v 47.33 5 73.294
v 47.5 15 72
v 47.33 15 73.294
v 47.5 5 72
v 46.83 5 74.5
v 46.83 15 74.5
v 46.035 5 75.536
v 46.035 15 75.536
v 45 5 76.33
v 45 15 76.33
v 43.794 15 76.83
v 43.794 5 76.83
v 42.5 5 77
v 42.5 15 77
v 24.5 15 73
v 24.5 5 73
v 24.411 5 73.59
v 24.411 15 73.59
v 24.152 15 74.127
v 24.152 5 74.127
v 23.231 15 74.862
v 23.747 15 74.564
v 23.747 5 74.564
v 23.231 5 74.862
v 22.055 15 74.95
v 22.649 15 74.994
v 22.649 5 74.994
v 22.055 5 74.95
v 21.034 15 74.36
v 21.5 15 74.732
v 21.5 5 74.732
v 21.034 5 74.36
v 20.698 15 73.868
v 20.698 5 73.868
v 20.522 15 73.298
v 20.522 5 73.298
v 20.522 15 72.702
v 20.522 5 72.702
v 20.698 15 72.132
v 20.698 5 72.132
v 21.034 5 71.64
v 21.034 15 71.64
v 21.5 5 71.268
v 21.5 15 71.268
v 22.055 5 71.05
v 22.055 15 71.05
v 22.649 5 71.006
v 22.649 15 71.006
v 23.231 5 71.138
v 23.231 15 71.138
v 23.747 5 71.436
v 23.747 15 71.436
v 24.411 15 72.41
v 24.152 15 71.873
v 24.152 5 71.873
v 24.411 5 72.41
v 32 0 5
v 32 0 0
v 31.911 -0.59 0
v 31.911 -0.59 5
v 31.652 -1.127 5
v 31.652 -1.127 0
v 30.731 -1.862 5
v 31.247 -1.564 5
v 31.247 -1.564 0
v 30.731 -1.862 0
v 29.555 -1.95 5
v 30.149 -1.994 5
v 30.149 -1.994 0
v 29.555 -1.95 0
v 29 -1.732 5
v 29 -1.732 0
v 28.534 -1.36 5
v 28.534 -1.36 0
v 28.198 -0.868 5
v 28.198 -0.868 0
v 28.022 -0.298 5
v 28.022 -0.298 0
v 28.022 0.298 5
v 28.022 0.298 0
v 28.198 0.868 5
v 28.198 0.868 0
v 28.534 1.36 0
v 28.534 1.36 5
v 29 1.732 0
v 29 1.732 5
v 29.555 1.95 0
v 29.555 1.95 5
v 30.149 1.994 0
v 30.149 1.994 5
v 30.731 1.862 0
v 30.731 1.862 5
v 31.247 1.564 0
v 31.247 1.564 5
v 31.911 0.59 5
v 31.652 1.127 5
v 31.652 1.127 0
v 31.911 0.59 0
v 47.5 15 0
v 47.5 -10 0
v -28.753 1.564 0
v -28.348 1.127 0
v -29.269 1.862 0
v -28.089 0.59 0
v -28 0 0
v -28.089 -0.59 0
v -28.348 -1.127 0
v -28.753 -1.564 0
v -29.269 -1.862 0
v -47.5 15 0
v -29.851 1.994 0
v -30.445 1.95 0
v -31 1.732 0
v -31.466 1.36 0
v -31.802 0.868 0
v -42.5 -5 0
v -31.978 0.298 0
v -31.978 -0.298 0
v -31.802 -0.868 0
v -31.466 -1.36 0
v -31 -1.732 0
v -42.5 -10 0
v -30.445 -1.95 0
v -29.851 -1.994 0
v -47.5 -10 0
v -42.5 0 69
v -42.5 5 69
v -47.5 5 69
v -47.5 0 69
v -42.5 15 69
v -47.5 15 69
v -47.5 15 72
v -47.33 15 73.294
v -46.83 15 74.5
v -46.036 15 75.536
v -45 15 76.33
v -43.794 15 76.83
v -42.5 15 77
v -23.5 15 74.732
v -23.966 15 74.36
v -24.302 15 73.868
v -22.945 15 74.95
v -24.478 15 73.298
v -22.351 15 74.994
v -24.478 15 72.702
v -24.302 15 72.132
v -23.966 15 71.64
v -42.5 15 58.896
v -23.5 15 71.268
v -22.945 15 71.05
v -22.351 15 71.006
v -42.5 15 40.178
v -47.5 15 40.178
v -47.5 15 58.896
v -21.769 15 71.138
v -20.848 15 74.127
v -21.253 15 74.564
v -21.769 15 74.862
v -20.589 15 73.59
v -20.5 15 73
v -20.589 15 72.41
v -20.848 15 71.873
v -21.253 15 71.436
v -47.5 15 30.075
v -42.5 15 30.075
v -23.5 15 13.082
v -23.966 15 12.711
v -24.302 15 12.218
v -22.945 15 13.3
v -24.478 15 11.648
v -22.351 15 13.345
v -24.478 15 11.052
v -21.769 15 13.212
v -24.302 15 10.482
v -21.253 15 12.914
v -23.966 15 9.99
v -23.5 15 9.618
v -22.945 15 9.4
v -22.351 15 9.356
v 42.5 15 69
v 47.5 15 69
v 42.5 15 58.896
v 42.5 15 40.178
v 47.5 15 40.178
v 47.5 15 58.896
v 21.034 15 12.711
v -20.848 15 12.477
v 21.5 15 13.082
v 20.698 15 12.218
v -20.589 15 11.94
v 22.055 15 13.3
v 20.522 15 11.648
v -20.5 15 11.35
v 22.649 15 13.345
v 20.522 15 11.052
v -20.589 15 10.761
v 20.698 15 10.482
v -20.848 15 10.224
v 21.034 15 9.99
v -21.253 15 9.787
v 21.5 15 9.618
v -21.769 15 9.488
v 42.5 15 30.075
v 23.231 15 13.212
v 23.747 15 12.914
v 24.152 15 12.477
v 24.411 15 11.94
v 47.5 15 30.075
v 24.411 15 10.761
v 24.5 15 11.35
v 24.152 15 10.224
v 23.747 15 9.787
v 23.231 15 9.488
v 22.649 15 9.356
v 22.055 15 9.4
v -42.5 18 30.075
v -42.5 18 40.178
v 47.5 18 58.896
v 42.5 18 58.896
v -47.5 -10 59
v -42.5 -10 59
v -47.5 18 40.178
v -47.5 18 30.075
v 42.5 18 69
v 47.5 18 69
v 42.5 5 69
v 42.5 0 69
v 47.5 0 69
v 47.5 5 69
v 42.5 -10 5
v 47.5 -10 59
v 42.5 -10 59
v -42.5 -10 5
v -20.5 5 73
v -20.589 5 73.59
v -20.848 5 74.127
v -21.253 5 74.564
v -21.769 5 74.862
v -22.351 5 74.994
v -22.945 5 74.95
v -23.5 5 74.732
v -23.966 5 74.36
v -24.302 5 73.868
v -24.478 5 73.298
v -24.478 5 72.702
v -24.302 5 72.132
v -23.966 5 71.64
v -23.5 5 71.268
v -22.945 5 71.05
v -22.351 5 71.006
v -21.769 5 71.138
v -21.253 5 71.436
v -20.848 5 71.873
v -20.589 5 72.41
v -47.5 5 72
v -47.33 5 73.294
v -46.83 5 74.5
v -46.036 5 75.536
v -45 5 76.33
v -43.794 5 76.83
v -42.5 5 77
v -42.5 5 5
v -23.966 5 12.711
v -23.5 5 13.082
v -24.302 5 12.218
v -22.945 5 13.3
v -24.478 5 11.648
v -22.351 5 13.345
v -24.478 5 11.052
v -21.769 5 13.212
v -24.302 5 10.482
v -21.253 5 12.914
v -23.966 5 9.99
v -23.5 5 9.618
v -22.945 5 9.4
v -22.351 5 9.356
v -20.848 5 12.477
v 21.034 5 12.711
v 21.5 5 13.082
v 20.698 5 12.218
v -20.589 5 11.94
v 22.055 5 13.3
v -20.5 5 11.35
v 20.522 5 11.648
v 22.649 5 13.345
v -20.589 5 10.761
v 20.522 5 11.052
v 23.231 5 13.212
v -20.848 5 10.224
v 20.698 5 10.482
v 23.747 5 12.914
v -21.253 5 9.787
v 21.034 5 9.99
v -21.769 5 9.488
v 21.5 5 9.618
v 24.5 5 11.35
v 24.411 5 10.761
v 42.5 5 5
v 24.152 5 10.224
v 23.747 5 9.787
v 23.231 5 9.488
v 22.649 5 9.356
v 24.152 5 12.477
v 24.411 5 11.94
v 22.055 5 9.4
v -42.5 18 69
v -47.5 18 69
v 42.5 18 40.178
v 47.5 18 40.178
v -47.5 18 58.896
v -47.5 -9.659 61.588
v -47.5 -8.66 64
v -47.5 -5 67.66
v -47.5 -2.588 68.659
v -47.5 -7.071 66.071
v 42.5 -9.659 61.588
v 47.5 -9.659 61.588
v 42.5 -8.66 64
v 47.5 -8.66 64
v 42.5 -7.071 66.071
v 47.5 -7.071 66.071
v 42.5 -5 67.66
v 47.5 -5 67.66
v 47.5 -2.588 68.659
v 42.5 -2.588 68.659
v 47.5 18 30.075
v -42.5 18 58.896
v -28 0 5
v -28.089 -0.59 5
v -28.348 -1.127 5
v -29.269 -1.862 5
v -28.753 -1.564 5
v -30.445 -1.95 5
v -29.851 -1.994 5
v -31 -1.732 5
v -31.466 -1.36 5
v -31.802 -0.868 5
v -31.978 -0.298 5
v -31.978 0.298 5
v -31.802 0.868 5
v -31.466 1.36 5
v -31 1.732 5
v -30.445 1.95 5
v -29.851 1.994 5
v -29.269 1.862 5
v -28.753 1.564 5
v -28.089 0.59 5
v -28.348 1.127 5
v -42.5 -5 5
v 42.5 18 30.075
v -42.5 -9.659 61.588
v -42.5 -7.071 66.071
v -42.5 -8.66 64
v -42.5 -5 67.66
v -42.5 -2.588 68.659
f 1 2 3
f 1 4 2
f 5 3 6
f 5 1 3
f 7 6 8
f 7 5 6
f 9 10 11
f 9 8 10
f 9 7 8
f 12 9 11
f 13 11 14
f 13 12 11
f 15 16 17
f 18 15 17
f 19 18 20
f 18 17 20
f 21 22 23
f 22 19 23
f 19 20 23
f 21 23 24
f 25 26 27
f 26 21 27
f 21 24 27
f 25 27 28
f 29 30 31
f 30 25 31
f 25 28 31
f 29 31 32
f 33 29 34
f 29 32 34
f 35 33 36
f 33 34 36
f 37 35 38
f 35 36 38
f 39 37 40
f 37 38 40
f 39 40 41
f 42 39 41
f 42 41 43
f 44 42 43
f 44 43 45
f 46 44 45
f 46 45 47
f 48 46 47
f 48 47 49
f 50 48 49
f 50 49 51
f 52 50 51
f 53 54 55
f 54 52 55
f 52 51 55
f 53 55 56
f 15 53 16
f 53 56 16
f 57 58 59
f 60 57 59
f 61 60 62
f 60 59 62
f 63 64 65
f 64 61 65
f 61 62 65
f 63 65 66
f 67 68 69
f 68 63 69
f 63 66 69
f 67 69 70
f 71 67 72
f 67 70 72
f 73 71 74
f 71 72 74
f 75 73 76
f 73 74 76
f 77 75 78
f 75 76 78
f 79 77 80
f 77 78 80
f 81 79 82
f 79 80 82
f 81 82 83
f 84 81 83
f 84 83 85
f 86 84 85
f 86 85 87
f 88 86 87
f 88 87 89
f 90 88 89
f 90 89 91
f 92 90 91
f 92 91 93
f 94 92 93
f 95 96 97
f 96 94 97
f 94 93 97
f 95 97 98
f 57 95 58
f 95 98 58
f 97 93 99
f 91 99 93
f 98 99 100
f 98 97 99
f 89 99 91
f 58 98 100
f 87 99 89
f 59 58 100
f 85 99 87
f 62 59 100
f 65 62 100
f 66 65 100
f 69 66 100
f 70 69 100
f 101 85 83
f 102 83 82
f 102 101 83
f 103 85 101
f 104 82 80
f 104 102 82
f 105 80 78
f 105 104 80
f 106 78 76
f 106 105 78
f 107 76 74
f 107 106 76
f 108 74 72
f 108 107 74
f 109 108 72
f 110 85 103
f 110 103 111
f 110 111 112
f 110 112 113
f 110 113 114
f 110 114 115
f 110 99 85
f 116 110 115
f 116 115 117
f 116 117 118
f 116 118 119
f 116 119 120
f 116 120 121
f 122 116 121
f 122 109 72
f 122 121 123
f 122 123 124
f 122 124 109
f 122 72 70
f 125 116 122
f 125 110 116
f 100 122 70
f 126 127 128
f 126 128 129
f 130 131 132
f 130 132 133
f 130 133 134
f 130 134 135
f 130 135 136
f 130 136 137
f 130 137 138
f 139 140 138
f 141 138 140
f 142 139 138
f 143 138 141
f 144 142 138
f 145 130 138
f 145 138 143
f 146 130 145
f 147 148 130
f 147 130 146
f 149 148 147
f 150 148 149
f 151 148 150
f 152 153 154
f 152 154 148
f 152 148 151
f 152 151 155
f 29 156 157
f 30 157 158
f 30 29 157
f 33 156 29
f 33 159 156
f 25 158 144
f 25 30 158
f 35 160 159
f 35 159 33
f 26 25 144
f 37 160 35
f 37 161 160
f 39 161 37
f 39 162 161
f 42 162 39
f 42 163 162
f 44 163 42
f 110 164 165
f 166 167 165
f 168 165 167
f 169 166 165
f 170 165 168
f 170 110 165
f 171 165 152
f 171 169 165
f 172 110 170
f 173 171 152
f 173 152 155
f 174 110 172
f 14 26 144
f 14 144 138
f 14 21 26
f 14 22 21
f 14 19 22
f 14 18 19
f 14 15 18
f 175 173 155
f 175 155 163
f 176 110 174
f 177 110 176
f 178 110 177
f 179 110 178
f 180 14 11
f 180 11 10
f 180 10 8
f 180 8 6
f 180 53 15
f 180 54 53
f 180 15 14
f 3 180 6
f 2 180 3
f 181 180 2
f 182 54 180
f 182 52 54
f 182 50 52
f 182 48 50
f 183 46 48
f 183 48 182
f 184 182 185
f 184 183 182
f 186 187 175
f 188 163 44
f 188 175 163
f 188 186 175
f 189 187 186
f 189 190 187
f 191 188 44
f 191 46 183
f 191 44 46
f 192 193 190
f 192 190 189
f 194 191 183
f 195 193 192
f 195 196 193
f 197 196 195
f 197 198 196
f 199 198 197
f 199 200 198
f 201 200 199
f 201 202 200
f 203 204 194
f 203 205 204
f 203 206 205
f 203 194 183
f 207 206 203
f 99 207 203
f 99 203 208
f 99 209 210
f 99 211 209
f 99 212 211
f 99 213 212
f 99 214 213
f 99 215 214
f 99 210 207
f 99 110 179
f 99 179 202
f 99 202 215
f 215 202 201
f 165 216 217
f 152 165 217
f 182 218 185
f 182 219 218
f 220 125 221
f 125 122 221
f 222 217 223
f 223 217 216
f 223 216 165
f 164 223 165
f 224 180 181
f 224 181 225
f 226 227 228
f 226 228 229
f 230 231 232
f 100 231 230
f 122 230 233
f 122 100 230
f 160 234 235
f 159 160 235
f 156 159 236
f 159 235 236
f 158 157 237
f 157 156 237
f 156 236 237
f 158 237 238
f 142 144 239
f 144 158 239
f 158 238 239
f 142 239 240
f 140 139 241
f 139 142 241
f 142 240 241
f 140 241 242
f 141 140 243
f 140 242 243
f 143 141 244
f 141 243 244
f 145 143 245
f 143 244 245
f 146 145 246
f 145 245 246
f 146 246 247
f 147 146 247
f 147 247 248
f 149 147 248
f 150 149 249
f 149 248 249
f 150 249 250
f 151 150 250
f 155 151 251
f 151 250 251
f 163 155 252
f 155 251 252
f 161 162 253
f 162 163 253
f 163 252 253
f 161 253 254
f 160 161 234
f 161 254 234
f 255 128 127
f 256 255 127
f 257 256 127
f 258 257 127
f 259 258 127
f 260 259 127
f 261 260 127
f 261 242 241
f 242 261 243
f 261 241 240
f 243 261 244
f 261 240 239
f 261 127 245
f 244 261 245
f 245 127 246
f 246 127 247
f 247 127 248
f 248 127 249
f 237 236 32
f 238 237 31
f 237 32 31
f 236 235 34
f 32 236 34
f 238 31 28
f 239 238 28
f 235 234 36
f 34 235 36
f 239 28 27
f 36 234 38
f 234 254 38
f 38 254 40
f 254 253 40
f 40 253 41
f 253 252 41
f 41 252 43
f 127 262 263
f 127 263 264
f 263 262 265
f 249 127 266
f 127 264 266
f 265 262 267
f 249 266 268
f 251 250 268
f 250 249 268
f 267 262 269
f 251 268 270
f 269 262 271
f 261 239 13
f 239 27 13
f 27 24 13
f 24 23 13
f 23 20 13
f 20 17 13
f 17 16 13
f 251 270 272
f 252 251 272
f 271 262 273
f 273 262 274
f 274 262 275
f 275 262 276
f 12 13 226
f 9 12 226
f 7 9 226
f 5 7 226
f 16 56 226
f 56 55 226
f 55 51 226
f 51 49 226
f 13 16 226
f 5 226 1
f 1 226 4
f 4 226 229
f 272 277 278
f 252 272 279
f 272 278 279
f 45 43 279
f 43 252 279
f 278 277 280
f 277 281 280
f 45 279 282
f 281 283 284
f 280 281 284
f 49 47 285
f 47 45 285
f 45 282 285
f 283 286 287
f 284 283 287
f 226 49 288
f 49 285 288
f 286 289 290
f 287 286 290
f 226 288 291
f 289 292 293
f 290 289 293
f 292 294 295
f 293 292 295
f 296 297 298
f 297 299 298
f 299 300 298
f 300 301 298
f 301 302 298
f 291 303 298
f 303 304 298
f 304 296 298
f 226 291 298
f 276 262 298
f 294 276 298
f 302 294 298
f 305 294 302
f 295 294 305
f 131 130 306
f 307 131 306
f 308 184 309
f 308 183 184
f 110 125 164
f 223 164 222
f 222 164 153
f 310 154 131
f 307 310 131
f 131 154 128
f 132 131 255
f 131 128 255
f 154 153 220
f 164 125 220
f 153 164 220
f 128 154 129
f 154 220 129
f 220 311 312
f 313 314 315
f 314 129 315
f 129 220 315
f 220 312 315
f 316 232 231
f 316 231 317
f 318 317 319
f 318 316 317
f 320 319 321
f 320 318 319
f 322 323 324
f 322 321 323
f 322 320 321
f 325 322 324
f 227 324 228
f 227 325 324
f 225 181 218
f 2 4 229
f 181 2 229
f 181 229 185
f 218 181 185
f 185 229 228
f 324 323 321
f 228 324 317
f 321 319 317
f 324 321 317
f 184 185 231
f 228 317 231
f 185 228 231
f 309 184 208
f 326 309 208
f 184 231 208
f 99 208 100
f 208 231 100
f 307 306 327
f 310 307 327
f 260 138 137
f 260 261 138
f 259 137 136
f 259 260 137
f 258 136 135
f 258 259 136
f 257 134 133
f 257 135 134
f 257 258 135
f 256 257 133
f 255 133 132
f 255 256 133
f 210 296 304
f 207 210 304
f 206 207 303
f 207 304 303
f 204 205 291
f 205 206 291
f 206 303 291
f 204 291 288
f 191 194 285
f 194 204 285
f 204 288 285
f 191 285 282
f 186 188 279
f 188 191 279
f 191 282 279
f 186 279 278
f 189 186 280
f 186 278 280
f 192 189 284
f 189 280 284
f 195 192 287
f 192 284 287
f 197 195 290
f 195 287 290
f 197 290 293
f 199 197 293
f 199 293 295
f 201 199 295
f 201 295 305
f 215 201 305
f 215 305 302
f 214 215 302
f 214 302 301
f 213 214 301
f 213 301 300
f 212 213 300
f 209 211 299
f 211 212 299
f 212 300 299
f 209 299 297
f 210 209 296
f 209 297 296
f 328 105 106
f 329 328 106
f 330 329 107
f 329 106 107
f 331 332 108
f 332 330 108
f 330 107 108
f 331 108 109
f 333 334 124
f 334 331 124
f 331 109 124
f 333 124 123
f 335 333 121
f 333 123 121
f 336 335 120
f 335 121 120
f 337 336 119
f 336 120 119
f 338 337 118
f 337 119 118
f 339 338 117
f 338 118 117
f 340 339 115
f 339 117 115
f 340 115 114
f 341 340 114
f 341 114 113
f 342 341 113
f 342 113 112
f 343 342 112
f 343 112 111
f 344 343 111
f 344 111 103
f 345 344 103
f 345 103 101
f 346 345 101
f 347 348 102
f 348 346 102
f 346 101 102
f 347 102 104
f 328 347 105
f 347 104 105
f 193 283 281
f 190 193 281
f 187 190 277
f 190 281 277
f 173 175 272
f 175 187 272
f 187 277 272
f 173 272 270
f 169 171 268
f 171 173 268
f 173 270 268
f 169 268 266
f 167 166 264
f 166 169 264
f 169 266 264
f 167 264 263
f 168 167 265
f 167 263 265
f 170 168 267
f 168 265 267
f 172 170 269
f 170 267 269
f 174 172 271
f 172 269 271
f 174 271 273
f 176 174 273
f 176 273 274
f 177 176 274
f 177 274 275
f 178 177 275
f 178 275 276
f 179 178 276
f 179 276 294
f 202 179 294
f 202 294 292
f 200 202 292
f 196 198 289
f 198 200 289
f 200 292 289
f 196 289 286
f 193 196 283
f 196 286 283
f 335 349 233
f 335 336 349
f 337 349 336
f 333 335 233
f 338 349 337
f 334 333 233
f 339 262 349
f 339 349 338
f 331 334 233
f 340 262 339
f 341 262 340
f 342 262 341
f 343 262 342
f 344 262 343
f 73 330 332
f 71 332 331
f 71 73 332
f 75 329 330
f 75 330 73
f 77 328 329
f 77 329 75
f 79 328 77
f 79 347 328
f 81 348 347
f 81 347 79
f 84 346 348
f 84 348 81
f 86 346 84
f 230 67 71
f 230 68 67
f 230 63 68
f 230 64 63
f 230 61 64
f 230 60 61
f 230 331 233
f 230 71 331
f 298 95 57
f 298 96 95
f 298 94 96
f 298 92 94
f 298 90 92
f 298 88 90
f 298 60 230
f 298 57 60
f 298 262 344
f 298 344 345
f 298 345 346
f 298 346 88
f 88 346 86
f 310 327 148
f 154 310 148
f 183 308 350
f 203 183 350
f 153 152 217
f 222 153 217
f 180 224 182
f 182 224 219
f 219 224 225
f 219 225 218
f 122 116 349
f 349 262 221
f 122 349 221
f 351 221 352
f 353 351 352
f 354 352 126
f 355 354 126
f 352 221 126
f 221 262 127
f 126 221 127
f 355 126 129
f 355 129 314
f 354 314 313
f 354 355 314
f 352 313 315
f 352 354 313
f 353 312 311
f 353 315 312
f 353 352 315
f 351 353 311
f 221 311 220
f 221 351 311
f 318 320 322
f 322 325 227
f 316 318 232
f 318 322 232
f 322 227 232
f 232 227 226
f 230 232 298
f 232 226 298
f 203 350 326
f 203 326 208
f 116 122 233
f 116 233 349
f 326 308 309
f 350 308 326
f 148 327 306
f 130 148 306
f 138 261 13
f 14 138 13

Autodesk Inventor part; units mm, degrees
ref_plane "YZ Plane" through (0, 0, 0) normal (1, 0, 0) x (0, 1, 0)
ref_plane "XZ Plane" through (0, 0, 0) normal (0, 1, 0) x (-1, 0, 0)
ref_plane "XY Plane" through (0, 0, 0) normal (0, 0, 1) x (1, 0, 0)
sketch "Sketch1" plane through (0, 0, 0) normal (0, 0, 1) x (1, 0, 0)
  line L0 (42.5, -5) -> (47.4999, -5)
  line L1 (42.5, -10) -> (-42.5, -10)
  line L2 (42.5, -10) -> (42.5, -5)
  line L3 (-42.5, -10) -> (-42.5, -4.9999)
  line L4 (-42.5, -4.9999) -> (-47.5001, -5)
  line L5 (-42.5001, 10) -> (-22.5001, 10)
  line L6 (-42.5001, 10) -> (-42.5001, 5)
  line L7 (42.4999, 10) -> (42.4999, 5)
  line L8 (-42.5001, 5) -> (-47.5001, 5)
  line L9 (42.4999, 5) -> (47.4999, 5)
  line L10 (22.4999, 10) -> (42.4999, 10)
  line L11 (-22.5001, 5) -> (-22.5001, 10)
  line L12 (-22.5001, 5) -> (22.4999, 5)
  line L13 (22.4999, 5) -> (22.4999, 10)
  circle A0 centre (30, 0) radius 2
  circle A1 centre (-30, 0) radius 2
  line L14 (-47.5001, -5) -> (-47.5001, 5)
  line L15 (47.4999, 5) -> (47.4999, -5)
  point P0 (0, 0)
  point P1 (-34.7671, -4.6223)
  dimension "d0" = 4
  dimension "d12" = 30
  dimension "d13" = 4
  dimension "d14" = 30
  dimension "d15" = 20
  dimension "d16" = 20
  dimension "d17" = 42.5
  dimension "d18" = 42.5
  dimension "d21" = 45
  dimension "d32" = 5
  dimension "d33" = 5
extrude "Leap AP" add sketch "Sketch1" along normal blind 5
sketch "Sketch2" plane through (-22.5001, 5, 0) normal (0, 1, 0) x (1, 0, 0)
  line L0 (-25, -56) -> (-20, -56)
  line L1 (70, -56) -> (65, -56)
  line L2 (-20, -56) -> (-20, -69)
  line L3 (-20, -69) -> (-25, -69)
  line L4 (-25, -69) -> (-25, -72)
  line L5 (65, -56) -> (65, -69)
  line L6 (65, -69) -> (70, -69)
  line L7 (70, -69) -> (70, -72)
  line L8 (65, -77) -> (-20, -77)
  line L9 (0, -5) -> (0, 0)
  arc A0 (-25, -72) -> (-20, -77) centre (-20, -72) ccw
  arc A1 (65, -77) -> (70, -72) centre (65, -72) ccw
  line L10 (0, -5) -> (-25, -5)
  line L11 (45, 0) -> (0, 0) projected
  line L12 (45, 0) -> (45, -5)
  circle A2 centre (0, -73) radius 2
  circle A3 centre (45, -73) radius 2
  line L13 (-25, -56) -> (-25, -5)
  line L14 (70, -56) -> (70, -5)
  circle A4 centre (0, -11.3502) radius 2
  circle A5 centre (45, -11.3502) radius 2
  line L15 (45, -5) -> (70, -5)
  point P0 (-25, -77)
  point P1 (70, -77)
  point P2 (69.9999, -5)
  point P3 (11.4357, -9.3722)
  dimension "d52" = 13
  dimension "d54" = 8
  dimension "d55" = 5
  dimension "d56" = 5
  dimension "d74" = 4
  dimension "d75" = 4
  dimension "d76" = 4
  dimension "d77" = 4
  dimension "d78" = 25
  dimension "d79" = 25
  dimension "d83" = 51
  dimension "d84" = 4
  dimension "d85" = 4
extrude "Leap Base" add sketch "Sketch2" along normal blind 5
sketch "Sketch3" plane through (-42.5001, 5, 0) normal (-1, 0, 0) x (0, 0, 1)
  line L0 (0, -9.9999) -> (5, -9.9999) projected
  line L1 (0, -9.9999) -> (0, -15) projected
  line L2 (0, -15) -> (5, -15) projected
  line L3 (0, 0) -> (5, 0) projected
  line L4 (5, -9.9999) -> (5, 0)
  line L5 (5, -15) -> (59, -15)
  line L6 (0, 0) -> (0, 5) projected
  line L7 (69, 5) -> (69, 13)
  line L8 (69, 5) -> (69, -5)
  arc A0 (59, -15) -> (69, -5) centre (59, -5) ccw
  line L9 (69, 13) -> (58.8965, 13)
  line L10 (58.8965, 13) -> (58.8965, 5)
  line L11 (40.1783, 5) -> (40.1783, 13)
  line L12 (40.1783, 13) -> (30.0747, 13)
  line L13 (30.0747, 13) -> (30.0747, 5)
  line L14 (0, 5) -> (30.0747, 5)
  line L15 (40.1783, 5) -> (58.8965, 5)
  point P0 (69, -15)
  point P1 (8.1162, -2.0146)
  dimension "d72" = 10
  dimension "d86" = 8
extrude "2x Leap Side" add sketch "Sketch3" along normal blind 5
sketch "Sketch4" plane through (42.4999, 5, 0) normal (1, 0, 0) x (0, 0, -1)
  line L0 (0, 5) -> (0, -15) projected
  line L1 (0, -15) -> (-59, -15) projected
  arc A0 (-69, -5) -> (-59, -15) centre (-59, -5) ccw projected
  line L2 (-69, -5) -> (-69, 0) projected
  line L3 (-69, 0) -> (-72, 0) projected
  line L4 (-72, 0) -> (-72, 5) projected
  line L5 (-69, 5) -> (-72, 5) projected
  line L6 (-69, 5) -> (-69, 13) projected
  line L7 (-69, 13) -> (-58.8965, 13) projected
  line L8 (-58.8965, 13) -> (-58.8965, 5) projected
  line L9 (-30.0747, 5) -> (0, 5) projected
  line L10 (-40.1783, 5) -> (-58.8965, 5) projected
  line L11 (-40.1783, 5) -> (-40.1783, 13) projected
  line L12 (-40.1783, 13) -> (-30.0747, 13) projected
  line L13 (-30.0747, 13) -> (-30.0747, 5) projected
extrude "Extrusion4" add sketch "Sketch4" along normal blind 5
sketch "Sketch5" plane through (-47.5001, 10, 0) normal (0, 1, 0) x (1, 0, 0)
  line L0 (5, -58.8965) -> (0, -58.8965) projected
  line L1 (5, -69) -> (5, -58.8965) projected
  line L2 (5, -69) -> (0, -69) projected
  line L3 (0, -69) -> (0, -72) projected
  arc A0 (0, -72) -> (5, -77) centre (5, -72) ccw projected
  line L4 (5, -77) -> (90, -77) projected
  arc A1 (90, -77) -> (95, -72) centre (90, -72) ccw projected
  circle A2 centre (25, -73) radius 2 projected
  circle A3 centre (70, -73) radius 2 projected
  line L5 (0, 0) -> (95, 0) projected
  line L6 (0, -30.0747) -> (0, 0) projected
  line L7 (95, -40.1783) -> (95, -58.8965) projected
  line L8 (95, -30.0747) -> (95, 0) projected
  line L9 (0, -40.1783) -> (0, -58.8965) projected
  line L10 (90, -58.8965) -> (90, -69) projected
  line L11 (90, -58.8965) -> (95, -58.8965) projected
  line L12 (5, -30.0747) -> (0, -30.0747) projected
  line L13 (5, -40.1783) -> (5, -30.0747) projected
  line L14 (5, -40.1783) -> (0, -40.1783) projected
  line L15 (90, -40.1783) -> (95, -40.1783) projected
  line L16 (90, -30.0747) -> (90, -40.1783) projected
  line L17 (90, -30.0747) -> (95, -30.0747) projected
  line L18 (90, -69) -> (95, -69) projected
  line L19 (95, -72) -> (95, -69) projected
  circle A4 centre (25, -11.3502) radius 2 projected
  circle A5 centre (70, -11.3502) radius 2 projected
  point P0 (31.9525, -5.2817)
extrude "Leap Top Base" add sketch "Sketch5" along normal blind 5
properties part number "Attaching Point" material "Nylon 6/6"
